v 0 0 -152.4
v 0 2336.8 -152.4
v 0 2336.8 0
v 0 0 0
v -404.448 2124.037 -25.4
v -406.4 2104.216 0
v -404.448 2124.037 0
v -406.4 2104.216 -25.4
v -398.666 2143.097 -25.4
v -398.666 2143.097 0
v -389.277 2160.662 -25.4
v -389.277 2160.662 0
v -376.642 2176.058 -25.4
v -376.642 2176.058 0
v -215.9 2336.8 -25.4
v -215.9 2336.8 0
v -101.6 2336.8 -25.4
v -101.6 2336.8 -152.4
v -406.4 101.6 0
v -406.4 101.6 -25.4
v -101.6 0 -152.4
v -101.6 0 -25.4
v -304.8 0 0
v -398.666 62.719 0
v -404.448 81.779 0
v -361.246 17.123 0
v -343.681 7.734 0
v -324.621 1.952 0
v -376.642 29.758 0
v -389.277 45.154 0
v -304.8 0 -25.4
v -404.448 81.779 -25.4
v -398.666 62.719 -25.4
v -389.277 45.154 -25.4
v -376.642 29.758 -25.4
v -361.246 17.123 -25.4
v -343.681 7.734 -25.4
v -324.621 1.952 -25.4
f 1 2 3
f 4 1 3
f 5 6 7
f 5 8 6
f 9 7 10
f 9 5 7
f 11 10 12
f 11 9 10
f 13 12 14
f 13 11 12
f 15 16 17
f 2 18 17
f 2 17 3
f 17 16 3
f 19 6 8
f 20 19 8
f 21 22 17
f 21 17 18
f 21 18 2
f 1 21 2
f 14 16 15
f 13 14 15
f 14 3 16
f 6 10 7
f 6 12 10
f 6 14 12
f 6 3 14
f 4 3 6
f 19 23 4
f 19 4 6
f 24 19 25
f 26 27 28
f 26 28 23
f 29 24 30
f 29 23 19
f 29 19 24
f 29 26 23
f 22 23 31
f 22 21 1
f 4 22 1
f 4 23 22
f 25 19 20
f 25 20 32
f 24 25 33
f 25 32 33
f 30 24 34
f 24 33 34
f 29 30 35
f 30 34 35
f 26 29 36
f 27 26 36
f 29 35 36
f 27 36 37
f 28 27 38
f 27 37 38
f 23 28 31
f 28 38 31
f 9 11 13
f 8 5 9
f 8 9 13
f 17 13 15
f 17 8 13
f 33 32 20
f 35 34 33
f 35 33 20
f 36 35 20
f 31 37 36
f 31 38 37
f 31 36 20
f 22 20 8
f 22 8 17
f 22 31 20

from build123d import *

# Parameters (mm, degrees)
F1_DEPTH = 2336.8
F2_SIZE  = 190.5
F3_R     = 101.6


with BuildPart() as f1:
    # F0 (on Front) → F1 (new body)
    with BuildSketch(Plane.XZ):
        Polygon((0, 0), (-406.4, 0), (-406.4, -25.4), (-101.6, -25.4), (-101.6, -152.4), (0, -152.4), align=None)
    extrude(amount=-F1_DEPTH)

    # F2
    f2_edges = [f1.edges().sort_by_distance(p)[0] for p in [
        (-406.4, 2336.8, -12.7),
    ]]
    chamfer(f2_edges, length=F2_SIZE)

    # F3
    f3_edges = [f1.edges().sort_by_distance(p)[0] for p in [
        (-406.4, 2146.3, -12.7),
        (-406.4, 0, -12.7),
    ]]
    fillet(f3_edges, radius=F3_R)


solid = f1.part
